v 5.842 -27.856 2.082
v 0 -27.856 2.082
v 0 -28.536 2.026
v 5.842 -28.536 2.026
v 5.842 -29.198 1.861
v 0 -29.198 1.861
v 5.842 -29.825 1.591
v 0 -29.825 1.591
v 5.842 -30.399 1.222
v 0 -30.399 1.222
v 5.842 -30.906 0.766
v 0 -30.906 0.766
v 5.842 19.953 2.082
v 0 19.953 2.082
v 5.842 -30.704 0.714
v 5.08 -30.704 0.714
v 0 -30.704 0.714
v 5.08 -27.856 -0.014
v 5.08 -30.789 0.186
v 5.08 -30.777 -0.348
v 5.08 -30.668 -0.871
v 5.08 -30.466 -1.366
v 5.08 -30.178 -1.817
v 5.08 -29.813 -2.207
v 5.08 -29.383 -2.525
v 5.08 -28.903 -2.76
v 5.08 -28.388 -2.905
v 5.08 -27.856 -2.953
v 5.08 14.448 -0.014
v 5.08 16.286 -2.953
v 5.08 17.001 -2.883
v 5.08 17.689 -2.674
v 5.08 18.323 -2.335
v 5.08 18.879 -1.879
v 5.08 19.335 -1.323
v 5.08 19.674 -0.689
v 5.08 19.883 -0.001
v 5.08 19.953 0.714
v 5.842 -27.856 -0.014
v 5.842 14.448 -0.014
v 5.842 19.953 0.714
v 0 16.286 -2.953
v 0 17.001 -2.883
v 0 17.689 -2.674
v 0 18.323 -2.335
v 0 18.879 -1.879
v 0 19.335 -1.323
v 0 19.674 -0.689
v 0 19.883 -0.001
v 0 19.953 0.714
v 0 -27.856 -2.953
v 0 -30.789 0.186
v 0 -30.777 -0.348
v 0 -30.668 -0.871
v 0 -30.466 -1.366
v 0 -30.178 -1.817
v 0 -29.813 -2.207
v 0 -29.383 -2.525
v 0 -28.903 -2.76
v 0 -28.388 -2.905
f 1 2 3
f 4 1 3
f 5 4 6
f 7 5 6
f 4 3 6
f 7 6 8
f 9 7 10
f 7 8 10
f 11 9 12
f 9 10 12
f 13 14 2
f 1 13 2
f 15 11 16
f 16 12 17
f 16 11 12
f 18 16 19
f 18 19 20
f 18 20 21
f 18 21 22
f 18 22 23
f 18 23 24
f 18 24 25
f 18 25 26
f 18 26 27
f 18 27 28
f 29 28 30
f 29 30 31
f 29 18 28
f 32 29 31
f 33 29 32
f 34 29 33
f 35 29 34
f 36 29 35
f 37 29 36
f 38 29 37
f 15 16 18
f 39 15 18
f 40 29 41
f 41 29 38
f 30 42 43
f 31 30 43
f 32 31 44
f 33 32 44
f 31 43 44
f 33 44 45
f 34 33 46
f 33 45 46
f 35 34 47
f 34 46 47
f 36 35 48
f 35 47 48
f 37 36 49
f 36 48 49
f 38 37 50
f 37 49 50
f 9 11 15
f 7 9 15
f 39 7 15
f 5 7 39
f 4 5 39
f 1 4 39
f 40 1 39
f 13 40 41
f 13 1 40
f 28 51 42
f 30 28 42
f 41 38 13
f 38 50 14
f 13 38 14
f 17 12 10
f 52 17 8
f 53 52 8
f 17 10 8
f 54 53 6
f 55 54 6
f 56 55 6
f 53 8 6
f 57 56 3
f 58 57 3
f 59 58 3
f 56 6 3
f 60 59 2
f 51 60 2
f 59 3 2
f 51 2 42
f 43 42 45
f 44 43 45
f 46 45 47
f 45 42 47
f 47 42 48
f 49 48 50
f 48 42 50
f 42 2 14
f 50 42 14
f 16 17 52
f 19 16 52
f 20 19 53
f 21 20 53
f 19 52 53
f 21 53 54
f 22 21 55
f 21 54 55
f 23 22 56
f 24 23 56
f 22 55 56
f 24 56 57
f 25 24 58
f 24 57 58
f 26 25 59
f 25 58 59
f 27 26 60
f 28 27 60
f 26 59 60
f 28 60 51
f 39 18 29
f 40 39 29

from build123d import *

# Parameters (mm, degrees)
F0_W     = 42.3045453848
F0_H     = 2.0955
F1_DEPTH = 5.842
F0_H_2   = 2.9395276724
F2_DEPTH = 5.08


with BuildPart() as f1:
    # F0 (on Right) → F1 (new body)
    with BuildSketch(Plane.YZ):
        with BuildLine():
            Line((-27.856127011, -0.0136474585), (-27.856127011, 2.0818525415))
            ThreePointArc((-27.856127011, 2.0818525415), (-29.51683868, 1.7387763651), (-30.9056579084, 0.7657164176))
            Line((-30.9056579084, 0.7657164176), (-30.7041171732, 0.7142089649))
            Line((-30.7041171732, 0.7142089649), (-27.856127011, -0.0136474585))
        make_face()
        with Locations((-6.7038543186, 1.0341025415)):
            Rectangle(F0_W, F0_H)
        Polygon((19.4500260153, 2.0818525415), (14.4484183737, 2.0818525415), (14.4484183737, -0.0136474585), (19.953361936, 0.7142089649), (19.953361936, 2.0818525415), align=None)
    extrude(amount=F1_DEPTH)

    # F0 (on Right) → F2 (join)
    with BuildSketch(Plane.YZ):
        with BuildLine():
            Line((-27.856127011, -2.953175131), (-27.856127011, -0.0136474585))
            Line((-27.856127011, -0.0136474585), (-30.7041171732, 0.7142089649))
            ThreePointArc((-30.7041171732, 0.7142089649), (-30.1778049641, -1.816599044), (-27.856127011, -2.953175131))
        make_face()
        with Locations((-6.7038543186, -1.4834112948)):
            Rectangle(F0_W, F0_H_2)
        with BuildLine():
            Line((19.953361936, 0.7142089649), (14.4484183737, -0.0136474585))
            Line((14.4484183737, -0.0136474585), (14.4484183737, -2.953175131))
            Line((14.4484183737, -2.953175131), (16.2859778402, -2.953175131))
            ThreePointArc((16.2859778402, -2.953175131), (18.8792100035, -1.8790231985), (19.953361936, 0.7142089649))
        make_face()
    extrude(amount=F2_DEPTH)


solid = f1.part
